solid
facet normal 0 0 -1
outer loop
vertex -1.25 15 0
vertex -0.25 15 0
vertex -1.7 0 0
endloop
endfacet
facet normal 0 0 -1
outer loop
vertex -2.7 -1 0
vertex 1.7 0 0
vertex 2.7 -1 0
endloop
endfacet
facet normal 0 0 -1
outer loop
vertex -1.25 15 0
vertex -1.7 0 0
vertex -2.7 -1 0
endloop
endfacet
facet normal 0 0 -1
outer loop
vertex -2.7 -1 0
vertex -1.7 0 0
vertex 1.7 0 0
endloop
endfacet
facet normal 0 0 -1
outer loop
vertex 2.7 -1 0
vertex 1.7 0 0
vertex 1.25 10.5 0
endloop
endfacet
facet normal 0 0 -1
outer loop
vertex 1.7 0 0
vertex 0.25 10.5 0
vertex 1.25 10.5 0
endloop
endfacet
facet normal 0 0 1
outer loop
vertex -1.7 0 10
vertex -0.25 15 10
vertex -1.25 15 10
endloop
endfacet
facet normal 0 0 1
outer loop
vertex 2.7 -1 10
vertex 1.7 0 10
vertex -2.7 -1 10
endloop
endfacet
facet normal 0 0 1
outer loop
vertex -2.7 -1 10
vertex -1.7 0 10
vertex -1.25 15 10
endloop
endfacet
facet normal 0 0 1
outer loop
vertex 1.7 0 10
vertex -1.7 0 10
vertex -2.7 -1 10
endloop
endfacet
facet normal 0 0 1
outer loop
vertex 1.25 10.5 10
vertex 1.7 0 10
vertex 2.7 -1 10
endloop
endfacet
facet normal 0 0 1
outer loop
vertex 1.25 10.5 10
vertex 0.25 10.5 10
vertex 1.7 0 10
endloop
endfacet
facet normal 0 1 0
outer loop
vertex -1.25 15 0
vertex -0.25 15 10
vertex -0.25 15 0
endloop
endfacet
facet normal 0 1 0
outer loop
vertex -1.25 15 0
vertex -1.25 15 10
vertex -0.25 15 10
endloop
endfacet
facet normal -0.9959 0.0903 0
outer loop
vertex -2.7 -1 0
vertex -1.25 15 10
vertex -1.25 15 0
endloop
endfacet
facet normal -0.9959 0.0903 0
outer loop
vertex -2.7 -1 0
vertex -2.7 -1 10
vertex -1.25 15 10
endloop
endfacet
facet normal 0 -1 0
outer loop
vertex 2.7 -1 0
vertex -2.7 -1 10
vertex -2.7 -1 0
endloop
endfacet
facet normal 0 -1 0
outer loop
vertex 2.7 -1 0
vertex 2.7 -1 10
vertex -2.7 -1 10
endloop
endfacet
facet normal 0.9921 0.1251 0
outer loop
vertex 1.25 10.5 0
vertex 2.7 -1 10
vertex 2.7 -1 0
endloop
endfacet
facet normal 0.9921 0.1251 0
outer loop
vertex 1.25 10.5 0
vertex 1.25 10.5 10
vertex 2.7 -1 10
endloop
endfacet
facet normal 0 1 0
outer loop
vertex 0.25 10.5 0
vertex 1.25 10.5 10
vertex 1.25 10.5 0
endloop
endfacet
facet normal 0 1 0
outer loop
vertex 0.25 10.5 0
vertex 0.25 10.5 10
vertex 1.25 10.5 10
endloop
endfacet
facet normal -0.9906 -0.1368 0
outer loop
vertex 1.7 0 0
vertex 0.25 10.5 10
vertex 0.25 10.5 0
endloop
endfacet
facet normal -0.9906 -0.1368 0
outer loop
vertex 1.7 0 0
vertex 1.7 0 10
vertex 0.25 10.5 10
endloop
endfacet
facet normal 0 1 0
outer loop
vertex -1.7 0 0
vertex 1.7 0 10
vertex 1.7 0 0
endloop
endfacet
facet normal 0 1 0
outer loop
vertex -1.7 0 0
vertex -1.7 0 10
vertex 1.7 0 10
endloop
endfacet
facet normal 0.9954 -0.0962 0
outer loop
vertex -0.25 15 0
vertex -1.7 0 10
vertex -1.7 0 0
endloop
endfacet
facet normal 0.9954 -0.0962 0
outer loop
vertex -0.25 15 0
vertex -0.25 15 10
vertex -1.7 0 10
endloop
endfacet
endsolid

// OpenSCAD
/* Tumbler Tag by xifle */

// preview[view:north, tilt:top]
/* [Parameters] */

// The maximum glass thickness this tag will work with in mm
GLASS_MAX = 2.5;

// The minimum glass thickness this tag will work with in mm
GLASS_MIN = 0.5;

// The height of the tag in mm
HEIGHT = 15; //[5:30]

// The width of the tag in mm
WIDTH = 10; //[5:30]

// Wall thickness in mm
WALL = 1;

/* [Hidden] */

RADIUS = (WALL-0.1)/2;

linear_extrude(height=WIDTH) {
union() {
	halfed_outline(GLASS_MAX, GLASS_MIN, HEIGHT*0.7, RADIUS, WALL);
	mirror([1,0,0]) {
		halfed_outline(GLASS_MAX, GLASS_MIN, HEIGHT, RADIUS, WALL);
	}
}
}

module halfed_outline(max, min, height, radius, wall) {

	polygon(points=[[0,0],[max/2+radius,0],[min/2,height],[min/2+wall,height], [max/2+radius+wall,-wall], [0,-wall]], paths=[[0,1,2,3,4,5]]);

}
